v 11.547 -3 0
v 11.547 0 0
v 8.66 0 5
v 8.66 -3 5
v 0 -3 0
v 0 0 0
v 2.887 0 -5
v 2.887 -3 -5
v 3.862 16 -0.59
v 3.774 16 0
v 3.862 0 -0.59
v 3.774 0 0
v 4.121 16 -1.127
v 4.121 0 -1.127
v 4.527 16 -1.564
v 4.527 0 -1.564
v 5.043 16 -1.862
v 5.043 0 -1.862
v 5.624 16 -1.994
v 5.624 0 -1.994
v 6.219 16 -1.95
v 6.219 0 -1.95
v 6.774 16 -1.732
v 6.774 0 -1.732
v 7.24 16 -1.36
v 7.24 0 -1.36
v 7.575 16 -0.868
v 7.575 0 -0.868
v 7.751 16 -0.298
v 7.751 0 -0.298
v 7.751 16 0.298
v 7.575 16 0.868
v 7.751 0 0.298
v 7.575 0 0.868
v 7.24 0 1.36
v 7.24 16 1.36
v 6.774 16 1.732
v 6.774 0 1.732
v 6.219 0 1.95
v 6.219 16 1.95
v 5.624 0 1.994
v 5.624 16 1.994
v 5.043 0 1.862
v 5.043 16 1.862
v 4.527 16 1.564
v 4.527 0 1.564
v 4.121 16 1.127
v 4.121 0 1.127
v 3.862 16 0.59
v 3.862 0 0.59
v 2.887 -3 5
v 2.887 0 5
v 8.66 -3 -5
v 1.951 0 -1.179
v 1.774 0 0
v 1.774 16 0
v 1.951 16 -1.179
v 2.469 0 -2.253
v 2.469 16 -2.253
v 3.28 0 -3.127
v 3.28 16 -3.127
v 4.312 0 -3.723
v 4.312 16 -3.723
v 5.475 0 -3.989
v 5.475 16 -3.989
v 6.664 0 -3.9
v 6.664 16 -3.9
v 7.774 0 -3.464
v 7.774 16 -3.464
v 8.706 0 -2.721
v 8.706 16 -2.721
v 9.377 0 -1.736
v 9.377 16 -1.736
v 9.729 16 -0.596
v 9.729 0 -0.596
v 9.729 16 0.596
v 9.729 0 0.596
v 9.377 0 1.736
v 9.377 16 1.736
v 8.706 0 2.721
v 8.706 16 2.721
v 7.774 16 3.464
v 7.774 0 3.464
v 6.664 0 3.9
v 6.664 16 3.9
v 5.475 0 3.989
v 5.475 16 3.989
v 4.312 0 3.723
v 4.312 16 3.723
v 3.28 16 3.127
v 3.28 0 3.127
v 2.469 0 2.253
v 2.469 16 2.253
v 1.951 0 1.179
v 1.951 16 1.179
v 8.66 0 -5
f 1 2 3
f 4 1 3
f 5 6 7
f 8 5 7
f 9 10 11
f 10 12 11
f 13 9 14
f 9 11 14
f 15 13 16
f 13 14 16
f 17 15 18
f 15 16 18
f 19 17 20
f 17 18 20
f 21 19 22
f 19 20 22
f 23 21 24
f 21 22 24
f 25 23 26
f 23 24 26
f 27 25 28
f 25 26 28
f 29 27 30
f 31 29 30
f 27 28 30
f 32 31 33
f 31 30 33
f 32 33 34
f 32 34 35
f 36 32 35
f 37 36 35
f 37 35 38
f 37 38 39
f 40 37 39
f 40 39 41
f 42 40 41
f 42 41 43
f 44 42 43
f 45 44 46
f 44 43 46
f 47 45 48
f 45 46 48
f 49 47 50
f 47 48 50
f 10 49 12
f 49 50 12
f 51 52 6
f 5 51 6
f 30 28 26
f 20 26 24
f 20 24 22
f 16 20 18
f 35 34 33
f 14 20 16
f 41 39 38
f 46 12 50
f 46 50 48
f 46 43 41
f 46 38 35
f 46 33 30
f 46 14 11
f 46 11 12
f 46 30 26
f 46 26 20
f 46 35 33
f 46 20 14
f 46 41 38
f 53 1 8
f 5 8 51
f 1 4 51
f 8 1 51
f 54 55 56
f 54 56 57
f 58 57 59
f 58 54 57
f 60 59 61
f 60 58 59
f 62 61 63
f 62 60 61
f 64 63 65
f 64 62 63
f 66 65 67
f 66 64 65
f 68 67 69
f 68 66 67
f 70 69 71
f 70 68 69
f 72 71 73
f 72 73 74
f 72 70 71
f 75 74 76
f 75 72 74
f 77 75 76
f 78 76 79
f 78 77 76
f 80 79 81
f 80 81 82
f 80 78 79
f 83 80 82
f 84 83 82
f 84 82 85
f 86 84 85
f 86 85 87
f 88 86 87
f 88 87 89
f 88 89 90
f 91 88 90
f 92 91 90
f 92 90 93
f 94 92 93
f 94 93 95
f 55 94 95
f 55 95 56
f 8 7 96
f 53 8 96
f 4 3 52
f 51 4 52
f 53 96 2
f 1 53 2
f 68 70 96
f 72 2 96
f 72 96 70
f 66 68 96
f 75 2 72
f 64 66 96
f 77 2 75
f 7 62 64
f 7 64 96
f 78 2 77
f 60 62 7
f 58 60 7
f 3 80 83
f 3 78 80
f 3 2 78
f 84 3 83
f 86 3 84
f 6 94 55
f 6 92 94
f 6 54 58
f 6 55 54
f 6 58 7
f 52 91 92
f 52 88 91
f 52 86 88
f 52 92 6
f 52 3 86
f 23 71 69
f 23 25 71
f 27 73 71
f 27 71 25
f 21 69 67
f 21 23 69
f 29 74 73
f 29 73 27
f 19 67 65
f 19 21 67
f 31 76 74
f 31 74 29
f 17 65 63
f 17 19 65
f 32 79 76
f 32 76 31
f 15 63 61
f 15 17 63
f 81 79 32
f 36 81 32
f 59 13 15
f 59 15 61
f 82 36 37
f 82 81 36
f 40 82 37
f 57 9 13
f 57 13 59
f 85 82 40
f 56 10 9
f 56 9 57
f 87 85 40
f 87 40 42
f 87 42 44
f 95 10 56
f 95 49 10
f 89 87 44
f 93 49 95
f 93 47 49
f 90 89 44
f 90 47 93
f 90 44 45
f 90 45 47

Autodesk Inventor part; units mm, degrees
ref_plane "YZ Plane" through (0, 0, 0) normal (1, 0, 0) x (0, 1, 0)
ref_plane "XZ Plane" through (0, 0, 0) normal (0, 1, 0) x (-1, 0, 0)
ref_plane "XY Plane" through (0, 0, 0) normal (0, 0, 1) x (1, 0, 0)
sketch "Sketch1" plane through (0, 0, 0) normal (0, 1, 0) x (-1, 0, 0)
  line L0 (0, 0) -> (-11.547, 0)
  line L1 (-11.547, 0) -> (-8.6603, 5)
  line L2 (-8.6603, 5) -> (-2.8868, 5)
  line L3 (-2.8868, 5) -> (0, 0)
  line L4 (0, 0) -> (-2.8868, -5)
  line L5 (-2.8868, -5) -> (-8.6603, -5)
  line L6 (-8.6603, -5) -> (-11.547, 0)
  circle A0 centre (-5.7735, 0) radius 4
  circle A1 centre (-5.7735, 0) radius 2
  dimension "d0" = 10
  dimension "d1" = 8
  dimension "d2" = 4
extrude "Extrusion1" add sketch "Sketch1" against normal blind 3
extrude "Extrusion2" add sketch "Sketch1" along normal blind 16 contours A0 L0 A1 | L0 A1 A0
thread "Thread1" size "M8x1.25" class "6g" standard "ANSI Metric M Profile" full length
properties part number "HUDSON-1-87"
